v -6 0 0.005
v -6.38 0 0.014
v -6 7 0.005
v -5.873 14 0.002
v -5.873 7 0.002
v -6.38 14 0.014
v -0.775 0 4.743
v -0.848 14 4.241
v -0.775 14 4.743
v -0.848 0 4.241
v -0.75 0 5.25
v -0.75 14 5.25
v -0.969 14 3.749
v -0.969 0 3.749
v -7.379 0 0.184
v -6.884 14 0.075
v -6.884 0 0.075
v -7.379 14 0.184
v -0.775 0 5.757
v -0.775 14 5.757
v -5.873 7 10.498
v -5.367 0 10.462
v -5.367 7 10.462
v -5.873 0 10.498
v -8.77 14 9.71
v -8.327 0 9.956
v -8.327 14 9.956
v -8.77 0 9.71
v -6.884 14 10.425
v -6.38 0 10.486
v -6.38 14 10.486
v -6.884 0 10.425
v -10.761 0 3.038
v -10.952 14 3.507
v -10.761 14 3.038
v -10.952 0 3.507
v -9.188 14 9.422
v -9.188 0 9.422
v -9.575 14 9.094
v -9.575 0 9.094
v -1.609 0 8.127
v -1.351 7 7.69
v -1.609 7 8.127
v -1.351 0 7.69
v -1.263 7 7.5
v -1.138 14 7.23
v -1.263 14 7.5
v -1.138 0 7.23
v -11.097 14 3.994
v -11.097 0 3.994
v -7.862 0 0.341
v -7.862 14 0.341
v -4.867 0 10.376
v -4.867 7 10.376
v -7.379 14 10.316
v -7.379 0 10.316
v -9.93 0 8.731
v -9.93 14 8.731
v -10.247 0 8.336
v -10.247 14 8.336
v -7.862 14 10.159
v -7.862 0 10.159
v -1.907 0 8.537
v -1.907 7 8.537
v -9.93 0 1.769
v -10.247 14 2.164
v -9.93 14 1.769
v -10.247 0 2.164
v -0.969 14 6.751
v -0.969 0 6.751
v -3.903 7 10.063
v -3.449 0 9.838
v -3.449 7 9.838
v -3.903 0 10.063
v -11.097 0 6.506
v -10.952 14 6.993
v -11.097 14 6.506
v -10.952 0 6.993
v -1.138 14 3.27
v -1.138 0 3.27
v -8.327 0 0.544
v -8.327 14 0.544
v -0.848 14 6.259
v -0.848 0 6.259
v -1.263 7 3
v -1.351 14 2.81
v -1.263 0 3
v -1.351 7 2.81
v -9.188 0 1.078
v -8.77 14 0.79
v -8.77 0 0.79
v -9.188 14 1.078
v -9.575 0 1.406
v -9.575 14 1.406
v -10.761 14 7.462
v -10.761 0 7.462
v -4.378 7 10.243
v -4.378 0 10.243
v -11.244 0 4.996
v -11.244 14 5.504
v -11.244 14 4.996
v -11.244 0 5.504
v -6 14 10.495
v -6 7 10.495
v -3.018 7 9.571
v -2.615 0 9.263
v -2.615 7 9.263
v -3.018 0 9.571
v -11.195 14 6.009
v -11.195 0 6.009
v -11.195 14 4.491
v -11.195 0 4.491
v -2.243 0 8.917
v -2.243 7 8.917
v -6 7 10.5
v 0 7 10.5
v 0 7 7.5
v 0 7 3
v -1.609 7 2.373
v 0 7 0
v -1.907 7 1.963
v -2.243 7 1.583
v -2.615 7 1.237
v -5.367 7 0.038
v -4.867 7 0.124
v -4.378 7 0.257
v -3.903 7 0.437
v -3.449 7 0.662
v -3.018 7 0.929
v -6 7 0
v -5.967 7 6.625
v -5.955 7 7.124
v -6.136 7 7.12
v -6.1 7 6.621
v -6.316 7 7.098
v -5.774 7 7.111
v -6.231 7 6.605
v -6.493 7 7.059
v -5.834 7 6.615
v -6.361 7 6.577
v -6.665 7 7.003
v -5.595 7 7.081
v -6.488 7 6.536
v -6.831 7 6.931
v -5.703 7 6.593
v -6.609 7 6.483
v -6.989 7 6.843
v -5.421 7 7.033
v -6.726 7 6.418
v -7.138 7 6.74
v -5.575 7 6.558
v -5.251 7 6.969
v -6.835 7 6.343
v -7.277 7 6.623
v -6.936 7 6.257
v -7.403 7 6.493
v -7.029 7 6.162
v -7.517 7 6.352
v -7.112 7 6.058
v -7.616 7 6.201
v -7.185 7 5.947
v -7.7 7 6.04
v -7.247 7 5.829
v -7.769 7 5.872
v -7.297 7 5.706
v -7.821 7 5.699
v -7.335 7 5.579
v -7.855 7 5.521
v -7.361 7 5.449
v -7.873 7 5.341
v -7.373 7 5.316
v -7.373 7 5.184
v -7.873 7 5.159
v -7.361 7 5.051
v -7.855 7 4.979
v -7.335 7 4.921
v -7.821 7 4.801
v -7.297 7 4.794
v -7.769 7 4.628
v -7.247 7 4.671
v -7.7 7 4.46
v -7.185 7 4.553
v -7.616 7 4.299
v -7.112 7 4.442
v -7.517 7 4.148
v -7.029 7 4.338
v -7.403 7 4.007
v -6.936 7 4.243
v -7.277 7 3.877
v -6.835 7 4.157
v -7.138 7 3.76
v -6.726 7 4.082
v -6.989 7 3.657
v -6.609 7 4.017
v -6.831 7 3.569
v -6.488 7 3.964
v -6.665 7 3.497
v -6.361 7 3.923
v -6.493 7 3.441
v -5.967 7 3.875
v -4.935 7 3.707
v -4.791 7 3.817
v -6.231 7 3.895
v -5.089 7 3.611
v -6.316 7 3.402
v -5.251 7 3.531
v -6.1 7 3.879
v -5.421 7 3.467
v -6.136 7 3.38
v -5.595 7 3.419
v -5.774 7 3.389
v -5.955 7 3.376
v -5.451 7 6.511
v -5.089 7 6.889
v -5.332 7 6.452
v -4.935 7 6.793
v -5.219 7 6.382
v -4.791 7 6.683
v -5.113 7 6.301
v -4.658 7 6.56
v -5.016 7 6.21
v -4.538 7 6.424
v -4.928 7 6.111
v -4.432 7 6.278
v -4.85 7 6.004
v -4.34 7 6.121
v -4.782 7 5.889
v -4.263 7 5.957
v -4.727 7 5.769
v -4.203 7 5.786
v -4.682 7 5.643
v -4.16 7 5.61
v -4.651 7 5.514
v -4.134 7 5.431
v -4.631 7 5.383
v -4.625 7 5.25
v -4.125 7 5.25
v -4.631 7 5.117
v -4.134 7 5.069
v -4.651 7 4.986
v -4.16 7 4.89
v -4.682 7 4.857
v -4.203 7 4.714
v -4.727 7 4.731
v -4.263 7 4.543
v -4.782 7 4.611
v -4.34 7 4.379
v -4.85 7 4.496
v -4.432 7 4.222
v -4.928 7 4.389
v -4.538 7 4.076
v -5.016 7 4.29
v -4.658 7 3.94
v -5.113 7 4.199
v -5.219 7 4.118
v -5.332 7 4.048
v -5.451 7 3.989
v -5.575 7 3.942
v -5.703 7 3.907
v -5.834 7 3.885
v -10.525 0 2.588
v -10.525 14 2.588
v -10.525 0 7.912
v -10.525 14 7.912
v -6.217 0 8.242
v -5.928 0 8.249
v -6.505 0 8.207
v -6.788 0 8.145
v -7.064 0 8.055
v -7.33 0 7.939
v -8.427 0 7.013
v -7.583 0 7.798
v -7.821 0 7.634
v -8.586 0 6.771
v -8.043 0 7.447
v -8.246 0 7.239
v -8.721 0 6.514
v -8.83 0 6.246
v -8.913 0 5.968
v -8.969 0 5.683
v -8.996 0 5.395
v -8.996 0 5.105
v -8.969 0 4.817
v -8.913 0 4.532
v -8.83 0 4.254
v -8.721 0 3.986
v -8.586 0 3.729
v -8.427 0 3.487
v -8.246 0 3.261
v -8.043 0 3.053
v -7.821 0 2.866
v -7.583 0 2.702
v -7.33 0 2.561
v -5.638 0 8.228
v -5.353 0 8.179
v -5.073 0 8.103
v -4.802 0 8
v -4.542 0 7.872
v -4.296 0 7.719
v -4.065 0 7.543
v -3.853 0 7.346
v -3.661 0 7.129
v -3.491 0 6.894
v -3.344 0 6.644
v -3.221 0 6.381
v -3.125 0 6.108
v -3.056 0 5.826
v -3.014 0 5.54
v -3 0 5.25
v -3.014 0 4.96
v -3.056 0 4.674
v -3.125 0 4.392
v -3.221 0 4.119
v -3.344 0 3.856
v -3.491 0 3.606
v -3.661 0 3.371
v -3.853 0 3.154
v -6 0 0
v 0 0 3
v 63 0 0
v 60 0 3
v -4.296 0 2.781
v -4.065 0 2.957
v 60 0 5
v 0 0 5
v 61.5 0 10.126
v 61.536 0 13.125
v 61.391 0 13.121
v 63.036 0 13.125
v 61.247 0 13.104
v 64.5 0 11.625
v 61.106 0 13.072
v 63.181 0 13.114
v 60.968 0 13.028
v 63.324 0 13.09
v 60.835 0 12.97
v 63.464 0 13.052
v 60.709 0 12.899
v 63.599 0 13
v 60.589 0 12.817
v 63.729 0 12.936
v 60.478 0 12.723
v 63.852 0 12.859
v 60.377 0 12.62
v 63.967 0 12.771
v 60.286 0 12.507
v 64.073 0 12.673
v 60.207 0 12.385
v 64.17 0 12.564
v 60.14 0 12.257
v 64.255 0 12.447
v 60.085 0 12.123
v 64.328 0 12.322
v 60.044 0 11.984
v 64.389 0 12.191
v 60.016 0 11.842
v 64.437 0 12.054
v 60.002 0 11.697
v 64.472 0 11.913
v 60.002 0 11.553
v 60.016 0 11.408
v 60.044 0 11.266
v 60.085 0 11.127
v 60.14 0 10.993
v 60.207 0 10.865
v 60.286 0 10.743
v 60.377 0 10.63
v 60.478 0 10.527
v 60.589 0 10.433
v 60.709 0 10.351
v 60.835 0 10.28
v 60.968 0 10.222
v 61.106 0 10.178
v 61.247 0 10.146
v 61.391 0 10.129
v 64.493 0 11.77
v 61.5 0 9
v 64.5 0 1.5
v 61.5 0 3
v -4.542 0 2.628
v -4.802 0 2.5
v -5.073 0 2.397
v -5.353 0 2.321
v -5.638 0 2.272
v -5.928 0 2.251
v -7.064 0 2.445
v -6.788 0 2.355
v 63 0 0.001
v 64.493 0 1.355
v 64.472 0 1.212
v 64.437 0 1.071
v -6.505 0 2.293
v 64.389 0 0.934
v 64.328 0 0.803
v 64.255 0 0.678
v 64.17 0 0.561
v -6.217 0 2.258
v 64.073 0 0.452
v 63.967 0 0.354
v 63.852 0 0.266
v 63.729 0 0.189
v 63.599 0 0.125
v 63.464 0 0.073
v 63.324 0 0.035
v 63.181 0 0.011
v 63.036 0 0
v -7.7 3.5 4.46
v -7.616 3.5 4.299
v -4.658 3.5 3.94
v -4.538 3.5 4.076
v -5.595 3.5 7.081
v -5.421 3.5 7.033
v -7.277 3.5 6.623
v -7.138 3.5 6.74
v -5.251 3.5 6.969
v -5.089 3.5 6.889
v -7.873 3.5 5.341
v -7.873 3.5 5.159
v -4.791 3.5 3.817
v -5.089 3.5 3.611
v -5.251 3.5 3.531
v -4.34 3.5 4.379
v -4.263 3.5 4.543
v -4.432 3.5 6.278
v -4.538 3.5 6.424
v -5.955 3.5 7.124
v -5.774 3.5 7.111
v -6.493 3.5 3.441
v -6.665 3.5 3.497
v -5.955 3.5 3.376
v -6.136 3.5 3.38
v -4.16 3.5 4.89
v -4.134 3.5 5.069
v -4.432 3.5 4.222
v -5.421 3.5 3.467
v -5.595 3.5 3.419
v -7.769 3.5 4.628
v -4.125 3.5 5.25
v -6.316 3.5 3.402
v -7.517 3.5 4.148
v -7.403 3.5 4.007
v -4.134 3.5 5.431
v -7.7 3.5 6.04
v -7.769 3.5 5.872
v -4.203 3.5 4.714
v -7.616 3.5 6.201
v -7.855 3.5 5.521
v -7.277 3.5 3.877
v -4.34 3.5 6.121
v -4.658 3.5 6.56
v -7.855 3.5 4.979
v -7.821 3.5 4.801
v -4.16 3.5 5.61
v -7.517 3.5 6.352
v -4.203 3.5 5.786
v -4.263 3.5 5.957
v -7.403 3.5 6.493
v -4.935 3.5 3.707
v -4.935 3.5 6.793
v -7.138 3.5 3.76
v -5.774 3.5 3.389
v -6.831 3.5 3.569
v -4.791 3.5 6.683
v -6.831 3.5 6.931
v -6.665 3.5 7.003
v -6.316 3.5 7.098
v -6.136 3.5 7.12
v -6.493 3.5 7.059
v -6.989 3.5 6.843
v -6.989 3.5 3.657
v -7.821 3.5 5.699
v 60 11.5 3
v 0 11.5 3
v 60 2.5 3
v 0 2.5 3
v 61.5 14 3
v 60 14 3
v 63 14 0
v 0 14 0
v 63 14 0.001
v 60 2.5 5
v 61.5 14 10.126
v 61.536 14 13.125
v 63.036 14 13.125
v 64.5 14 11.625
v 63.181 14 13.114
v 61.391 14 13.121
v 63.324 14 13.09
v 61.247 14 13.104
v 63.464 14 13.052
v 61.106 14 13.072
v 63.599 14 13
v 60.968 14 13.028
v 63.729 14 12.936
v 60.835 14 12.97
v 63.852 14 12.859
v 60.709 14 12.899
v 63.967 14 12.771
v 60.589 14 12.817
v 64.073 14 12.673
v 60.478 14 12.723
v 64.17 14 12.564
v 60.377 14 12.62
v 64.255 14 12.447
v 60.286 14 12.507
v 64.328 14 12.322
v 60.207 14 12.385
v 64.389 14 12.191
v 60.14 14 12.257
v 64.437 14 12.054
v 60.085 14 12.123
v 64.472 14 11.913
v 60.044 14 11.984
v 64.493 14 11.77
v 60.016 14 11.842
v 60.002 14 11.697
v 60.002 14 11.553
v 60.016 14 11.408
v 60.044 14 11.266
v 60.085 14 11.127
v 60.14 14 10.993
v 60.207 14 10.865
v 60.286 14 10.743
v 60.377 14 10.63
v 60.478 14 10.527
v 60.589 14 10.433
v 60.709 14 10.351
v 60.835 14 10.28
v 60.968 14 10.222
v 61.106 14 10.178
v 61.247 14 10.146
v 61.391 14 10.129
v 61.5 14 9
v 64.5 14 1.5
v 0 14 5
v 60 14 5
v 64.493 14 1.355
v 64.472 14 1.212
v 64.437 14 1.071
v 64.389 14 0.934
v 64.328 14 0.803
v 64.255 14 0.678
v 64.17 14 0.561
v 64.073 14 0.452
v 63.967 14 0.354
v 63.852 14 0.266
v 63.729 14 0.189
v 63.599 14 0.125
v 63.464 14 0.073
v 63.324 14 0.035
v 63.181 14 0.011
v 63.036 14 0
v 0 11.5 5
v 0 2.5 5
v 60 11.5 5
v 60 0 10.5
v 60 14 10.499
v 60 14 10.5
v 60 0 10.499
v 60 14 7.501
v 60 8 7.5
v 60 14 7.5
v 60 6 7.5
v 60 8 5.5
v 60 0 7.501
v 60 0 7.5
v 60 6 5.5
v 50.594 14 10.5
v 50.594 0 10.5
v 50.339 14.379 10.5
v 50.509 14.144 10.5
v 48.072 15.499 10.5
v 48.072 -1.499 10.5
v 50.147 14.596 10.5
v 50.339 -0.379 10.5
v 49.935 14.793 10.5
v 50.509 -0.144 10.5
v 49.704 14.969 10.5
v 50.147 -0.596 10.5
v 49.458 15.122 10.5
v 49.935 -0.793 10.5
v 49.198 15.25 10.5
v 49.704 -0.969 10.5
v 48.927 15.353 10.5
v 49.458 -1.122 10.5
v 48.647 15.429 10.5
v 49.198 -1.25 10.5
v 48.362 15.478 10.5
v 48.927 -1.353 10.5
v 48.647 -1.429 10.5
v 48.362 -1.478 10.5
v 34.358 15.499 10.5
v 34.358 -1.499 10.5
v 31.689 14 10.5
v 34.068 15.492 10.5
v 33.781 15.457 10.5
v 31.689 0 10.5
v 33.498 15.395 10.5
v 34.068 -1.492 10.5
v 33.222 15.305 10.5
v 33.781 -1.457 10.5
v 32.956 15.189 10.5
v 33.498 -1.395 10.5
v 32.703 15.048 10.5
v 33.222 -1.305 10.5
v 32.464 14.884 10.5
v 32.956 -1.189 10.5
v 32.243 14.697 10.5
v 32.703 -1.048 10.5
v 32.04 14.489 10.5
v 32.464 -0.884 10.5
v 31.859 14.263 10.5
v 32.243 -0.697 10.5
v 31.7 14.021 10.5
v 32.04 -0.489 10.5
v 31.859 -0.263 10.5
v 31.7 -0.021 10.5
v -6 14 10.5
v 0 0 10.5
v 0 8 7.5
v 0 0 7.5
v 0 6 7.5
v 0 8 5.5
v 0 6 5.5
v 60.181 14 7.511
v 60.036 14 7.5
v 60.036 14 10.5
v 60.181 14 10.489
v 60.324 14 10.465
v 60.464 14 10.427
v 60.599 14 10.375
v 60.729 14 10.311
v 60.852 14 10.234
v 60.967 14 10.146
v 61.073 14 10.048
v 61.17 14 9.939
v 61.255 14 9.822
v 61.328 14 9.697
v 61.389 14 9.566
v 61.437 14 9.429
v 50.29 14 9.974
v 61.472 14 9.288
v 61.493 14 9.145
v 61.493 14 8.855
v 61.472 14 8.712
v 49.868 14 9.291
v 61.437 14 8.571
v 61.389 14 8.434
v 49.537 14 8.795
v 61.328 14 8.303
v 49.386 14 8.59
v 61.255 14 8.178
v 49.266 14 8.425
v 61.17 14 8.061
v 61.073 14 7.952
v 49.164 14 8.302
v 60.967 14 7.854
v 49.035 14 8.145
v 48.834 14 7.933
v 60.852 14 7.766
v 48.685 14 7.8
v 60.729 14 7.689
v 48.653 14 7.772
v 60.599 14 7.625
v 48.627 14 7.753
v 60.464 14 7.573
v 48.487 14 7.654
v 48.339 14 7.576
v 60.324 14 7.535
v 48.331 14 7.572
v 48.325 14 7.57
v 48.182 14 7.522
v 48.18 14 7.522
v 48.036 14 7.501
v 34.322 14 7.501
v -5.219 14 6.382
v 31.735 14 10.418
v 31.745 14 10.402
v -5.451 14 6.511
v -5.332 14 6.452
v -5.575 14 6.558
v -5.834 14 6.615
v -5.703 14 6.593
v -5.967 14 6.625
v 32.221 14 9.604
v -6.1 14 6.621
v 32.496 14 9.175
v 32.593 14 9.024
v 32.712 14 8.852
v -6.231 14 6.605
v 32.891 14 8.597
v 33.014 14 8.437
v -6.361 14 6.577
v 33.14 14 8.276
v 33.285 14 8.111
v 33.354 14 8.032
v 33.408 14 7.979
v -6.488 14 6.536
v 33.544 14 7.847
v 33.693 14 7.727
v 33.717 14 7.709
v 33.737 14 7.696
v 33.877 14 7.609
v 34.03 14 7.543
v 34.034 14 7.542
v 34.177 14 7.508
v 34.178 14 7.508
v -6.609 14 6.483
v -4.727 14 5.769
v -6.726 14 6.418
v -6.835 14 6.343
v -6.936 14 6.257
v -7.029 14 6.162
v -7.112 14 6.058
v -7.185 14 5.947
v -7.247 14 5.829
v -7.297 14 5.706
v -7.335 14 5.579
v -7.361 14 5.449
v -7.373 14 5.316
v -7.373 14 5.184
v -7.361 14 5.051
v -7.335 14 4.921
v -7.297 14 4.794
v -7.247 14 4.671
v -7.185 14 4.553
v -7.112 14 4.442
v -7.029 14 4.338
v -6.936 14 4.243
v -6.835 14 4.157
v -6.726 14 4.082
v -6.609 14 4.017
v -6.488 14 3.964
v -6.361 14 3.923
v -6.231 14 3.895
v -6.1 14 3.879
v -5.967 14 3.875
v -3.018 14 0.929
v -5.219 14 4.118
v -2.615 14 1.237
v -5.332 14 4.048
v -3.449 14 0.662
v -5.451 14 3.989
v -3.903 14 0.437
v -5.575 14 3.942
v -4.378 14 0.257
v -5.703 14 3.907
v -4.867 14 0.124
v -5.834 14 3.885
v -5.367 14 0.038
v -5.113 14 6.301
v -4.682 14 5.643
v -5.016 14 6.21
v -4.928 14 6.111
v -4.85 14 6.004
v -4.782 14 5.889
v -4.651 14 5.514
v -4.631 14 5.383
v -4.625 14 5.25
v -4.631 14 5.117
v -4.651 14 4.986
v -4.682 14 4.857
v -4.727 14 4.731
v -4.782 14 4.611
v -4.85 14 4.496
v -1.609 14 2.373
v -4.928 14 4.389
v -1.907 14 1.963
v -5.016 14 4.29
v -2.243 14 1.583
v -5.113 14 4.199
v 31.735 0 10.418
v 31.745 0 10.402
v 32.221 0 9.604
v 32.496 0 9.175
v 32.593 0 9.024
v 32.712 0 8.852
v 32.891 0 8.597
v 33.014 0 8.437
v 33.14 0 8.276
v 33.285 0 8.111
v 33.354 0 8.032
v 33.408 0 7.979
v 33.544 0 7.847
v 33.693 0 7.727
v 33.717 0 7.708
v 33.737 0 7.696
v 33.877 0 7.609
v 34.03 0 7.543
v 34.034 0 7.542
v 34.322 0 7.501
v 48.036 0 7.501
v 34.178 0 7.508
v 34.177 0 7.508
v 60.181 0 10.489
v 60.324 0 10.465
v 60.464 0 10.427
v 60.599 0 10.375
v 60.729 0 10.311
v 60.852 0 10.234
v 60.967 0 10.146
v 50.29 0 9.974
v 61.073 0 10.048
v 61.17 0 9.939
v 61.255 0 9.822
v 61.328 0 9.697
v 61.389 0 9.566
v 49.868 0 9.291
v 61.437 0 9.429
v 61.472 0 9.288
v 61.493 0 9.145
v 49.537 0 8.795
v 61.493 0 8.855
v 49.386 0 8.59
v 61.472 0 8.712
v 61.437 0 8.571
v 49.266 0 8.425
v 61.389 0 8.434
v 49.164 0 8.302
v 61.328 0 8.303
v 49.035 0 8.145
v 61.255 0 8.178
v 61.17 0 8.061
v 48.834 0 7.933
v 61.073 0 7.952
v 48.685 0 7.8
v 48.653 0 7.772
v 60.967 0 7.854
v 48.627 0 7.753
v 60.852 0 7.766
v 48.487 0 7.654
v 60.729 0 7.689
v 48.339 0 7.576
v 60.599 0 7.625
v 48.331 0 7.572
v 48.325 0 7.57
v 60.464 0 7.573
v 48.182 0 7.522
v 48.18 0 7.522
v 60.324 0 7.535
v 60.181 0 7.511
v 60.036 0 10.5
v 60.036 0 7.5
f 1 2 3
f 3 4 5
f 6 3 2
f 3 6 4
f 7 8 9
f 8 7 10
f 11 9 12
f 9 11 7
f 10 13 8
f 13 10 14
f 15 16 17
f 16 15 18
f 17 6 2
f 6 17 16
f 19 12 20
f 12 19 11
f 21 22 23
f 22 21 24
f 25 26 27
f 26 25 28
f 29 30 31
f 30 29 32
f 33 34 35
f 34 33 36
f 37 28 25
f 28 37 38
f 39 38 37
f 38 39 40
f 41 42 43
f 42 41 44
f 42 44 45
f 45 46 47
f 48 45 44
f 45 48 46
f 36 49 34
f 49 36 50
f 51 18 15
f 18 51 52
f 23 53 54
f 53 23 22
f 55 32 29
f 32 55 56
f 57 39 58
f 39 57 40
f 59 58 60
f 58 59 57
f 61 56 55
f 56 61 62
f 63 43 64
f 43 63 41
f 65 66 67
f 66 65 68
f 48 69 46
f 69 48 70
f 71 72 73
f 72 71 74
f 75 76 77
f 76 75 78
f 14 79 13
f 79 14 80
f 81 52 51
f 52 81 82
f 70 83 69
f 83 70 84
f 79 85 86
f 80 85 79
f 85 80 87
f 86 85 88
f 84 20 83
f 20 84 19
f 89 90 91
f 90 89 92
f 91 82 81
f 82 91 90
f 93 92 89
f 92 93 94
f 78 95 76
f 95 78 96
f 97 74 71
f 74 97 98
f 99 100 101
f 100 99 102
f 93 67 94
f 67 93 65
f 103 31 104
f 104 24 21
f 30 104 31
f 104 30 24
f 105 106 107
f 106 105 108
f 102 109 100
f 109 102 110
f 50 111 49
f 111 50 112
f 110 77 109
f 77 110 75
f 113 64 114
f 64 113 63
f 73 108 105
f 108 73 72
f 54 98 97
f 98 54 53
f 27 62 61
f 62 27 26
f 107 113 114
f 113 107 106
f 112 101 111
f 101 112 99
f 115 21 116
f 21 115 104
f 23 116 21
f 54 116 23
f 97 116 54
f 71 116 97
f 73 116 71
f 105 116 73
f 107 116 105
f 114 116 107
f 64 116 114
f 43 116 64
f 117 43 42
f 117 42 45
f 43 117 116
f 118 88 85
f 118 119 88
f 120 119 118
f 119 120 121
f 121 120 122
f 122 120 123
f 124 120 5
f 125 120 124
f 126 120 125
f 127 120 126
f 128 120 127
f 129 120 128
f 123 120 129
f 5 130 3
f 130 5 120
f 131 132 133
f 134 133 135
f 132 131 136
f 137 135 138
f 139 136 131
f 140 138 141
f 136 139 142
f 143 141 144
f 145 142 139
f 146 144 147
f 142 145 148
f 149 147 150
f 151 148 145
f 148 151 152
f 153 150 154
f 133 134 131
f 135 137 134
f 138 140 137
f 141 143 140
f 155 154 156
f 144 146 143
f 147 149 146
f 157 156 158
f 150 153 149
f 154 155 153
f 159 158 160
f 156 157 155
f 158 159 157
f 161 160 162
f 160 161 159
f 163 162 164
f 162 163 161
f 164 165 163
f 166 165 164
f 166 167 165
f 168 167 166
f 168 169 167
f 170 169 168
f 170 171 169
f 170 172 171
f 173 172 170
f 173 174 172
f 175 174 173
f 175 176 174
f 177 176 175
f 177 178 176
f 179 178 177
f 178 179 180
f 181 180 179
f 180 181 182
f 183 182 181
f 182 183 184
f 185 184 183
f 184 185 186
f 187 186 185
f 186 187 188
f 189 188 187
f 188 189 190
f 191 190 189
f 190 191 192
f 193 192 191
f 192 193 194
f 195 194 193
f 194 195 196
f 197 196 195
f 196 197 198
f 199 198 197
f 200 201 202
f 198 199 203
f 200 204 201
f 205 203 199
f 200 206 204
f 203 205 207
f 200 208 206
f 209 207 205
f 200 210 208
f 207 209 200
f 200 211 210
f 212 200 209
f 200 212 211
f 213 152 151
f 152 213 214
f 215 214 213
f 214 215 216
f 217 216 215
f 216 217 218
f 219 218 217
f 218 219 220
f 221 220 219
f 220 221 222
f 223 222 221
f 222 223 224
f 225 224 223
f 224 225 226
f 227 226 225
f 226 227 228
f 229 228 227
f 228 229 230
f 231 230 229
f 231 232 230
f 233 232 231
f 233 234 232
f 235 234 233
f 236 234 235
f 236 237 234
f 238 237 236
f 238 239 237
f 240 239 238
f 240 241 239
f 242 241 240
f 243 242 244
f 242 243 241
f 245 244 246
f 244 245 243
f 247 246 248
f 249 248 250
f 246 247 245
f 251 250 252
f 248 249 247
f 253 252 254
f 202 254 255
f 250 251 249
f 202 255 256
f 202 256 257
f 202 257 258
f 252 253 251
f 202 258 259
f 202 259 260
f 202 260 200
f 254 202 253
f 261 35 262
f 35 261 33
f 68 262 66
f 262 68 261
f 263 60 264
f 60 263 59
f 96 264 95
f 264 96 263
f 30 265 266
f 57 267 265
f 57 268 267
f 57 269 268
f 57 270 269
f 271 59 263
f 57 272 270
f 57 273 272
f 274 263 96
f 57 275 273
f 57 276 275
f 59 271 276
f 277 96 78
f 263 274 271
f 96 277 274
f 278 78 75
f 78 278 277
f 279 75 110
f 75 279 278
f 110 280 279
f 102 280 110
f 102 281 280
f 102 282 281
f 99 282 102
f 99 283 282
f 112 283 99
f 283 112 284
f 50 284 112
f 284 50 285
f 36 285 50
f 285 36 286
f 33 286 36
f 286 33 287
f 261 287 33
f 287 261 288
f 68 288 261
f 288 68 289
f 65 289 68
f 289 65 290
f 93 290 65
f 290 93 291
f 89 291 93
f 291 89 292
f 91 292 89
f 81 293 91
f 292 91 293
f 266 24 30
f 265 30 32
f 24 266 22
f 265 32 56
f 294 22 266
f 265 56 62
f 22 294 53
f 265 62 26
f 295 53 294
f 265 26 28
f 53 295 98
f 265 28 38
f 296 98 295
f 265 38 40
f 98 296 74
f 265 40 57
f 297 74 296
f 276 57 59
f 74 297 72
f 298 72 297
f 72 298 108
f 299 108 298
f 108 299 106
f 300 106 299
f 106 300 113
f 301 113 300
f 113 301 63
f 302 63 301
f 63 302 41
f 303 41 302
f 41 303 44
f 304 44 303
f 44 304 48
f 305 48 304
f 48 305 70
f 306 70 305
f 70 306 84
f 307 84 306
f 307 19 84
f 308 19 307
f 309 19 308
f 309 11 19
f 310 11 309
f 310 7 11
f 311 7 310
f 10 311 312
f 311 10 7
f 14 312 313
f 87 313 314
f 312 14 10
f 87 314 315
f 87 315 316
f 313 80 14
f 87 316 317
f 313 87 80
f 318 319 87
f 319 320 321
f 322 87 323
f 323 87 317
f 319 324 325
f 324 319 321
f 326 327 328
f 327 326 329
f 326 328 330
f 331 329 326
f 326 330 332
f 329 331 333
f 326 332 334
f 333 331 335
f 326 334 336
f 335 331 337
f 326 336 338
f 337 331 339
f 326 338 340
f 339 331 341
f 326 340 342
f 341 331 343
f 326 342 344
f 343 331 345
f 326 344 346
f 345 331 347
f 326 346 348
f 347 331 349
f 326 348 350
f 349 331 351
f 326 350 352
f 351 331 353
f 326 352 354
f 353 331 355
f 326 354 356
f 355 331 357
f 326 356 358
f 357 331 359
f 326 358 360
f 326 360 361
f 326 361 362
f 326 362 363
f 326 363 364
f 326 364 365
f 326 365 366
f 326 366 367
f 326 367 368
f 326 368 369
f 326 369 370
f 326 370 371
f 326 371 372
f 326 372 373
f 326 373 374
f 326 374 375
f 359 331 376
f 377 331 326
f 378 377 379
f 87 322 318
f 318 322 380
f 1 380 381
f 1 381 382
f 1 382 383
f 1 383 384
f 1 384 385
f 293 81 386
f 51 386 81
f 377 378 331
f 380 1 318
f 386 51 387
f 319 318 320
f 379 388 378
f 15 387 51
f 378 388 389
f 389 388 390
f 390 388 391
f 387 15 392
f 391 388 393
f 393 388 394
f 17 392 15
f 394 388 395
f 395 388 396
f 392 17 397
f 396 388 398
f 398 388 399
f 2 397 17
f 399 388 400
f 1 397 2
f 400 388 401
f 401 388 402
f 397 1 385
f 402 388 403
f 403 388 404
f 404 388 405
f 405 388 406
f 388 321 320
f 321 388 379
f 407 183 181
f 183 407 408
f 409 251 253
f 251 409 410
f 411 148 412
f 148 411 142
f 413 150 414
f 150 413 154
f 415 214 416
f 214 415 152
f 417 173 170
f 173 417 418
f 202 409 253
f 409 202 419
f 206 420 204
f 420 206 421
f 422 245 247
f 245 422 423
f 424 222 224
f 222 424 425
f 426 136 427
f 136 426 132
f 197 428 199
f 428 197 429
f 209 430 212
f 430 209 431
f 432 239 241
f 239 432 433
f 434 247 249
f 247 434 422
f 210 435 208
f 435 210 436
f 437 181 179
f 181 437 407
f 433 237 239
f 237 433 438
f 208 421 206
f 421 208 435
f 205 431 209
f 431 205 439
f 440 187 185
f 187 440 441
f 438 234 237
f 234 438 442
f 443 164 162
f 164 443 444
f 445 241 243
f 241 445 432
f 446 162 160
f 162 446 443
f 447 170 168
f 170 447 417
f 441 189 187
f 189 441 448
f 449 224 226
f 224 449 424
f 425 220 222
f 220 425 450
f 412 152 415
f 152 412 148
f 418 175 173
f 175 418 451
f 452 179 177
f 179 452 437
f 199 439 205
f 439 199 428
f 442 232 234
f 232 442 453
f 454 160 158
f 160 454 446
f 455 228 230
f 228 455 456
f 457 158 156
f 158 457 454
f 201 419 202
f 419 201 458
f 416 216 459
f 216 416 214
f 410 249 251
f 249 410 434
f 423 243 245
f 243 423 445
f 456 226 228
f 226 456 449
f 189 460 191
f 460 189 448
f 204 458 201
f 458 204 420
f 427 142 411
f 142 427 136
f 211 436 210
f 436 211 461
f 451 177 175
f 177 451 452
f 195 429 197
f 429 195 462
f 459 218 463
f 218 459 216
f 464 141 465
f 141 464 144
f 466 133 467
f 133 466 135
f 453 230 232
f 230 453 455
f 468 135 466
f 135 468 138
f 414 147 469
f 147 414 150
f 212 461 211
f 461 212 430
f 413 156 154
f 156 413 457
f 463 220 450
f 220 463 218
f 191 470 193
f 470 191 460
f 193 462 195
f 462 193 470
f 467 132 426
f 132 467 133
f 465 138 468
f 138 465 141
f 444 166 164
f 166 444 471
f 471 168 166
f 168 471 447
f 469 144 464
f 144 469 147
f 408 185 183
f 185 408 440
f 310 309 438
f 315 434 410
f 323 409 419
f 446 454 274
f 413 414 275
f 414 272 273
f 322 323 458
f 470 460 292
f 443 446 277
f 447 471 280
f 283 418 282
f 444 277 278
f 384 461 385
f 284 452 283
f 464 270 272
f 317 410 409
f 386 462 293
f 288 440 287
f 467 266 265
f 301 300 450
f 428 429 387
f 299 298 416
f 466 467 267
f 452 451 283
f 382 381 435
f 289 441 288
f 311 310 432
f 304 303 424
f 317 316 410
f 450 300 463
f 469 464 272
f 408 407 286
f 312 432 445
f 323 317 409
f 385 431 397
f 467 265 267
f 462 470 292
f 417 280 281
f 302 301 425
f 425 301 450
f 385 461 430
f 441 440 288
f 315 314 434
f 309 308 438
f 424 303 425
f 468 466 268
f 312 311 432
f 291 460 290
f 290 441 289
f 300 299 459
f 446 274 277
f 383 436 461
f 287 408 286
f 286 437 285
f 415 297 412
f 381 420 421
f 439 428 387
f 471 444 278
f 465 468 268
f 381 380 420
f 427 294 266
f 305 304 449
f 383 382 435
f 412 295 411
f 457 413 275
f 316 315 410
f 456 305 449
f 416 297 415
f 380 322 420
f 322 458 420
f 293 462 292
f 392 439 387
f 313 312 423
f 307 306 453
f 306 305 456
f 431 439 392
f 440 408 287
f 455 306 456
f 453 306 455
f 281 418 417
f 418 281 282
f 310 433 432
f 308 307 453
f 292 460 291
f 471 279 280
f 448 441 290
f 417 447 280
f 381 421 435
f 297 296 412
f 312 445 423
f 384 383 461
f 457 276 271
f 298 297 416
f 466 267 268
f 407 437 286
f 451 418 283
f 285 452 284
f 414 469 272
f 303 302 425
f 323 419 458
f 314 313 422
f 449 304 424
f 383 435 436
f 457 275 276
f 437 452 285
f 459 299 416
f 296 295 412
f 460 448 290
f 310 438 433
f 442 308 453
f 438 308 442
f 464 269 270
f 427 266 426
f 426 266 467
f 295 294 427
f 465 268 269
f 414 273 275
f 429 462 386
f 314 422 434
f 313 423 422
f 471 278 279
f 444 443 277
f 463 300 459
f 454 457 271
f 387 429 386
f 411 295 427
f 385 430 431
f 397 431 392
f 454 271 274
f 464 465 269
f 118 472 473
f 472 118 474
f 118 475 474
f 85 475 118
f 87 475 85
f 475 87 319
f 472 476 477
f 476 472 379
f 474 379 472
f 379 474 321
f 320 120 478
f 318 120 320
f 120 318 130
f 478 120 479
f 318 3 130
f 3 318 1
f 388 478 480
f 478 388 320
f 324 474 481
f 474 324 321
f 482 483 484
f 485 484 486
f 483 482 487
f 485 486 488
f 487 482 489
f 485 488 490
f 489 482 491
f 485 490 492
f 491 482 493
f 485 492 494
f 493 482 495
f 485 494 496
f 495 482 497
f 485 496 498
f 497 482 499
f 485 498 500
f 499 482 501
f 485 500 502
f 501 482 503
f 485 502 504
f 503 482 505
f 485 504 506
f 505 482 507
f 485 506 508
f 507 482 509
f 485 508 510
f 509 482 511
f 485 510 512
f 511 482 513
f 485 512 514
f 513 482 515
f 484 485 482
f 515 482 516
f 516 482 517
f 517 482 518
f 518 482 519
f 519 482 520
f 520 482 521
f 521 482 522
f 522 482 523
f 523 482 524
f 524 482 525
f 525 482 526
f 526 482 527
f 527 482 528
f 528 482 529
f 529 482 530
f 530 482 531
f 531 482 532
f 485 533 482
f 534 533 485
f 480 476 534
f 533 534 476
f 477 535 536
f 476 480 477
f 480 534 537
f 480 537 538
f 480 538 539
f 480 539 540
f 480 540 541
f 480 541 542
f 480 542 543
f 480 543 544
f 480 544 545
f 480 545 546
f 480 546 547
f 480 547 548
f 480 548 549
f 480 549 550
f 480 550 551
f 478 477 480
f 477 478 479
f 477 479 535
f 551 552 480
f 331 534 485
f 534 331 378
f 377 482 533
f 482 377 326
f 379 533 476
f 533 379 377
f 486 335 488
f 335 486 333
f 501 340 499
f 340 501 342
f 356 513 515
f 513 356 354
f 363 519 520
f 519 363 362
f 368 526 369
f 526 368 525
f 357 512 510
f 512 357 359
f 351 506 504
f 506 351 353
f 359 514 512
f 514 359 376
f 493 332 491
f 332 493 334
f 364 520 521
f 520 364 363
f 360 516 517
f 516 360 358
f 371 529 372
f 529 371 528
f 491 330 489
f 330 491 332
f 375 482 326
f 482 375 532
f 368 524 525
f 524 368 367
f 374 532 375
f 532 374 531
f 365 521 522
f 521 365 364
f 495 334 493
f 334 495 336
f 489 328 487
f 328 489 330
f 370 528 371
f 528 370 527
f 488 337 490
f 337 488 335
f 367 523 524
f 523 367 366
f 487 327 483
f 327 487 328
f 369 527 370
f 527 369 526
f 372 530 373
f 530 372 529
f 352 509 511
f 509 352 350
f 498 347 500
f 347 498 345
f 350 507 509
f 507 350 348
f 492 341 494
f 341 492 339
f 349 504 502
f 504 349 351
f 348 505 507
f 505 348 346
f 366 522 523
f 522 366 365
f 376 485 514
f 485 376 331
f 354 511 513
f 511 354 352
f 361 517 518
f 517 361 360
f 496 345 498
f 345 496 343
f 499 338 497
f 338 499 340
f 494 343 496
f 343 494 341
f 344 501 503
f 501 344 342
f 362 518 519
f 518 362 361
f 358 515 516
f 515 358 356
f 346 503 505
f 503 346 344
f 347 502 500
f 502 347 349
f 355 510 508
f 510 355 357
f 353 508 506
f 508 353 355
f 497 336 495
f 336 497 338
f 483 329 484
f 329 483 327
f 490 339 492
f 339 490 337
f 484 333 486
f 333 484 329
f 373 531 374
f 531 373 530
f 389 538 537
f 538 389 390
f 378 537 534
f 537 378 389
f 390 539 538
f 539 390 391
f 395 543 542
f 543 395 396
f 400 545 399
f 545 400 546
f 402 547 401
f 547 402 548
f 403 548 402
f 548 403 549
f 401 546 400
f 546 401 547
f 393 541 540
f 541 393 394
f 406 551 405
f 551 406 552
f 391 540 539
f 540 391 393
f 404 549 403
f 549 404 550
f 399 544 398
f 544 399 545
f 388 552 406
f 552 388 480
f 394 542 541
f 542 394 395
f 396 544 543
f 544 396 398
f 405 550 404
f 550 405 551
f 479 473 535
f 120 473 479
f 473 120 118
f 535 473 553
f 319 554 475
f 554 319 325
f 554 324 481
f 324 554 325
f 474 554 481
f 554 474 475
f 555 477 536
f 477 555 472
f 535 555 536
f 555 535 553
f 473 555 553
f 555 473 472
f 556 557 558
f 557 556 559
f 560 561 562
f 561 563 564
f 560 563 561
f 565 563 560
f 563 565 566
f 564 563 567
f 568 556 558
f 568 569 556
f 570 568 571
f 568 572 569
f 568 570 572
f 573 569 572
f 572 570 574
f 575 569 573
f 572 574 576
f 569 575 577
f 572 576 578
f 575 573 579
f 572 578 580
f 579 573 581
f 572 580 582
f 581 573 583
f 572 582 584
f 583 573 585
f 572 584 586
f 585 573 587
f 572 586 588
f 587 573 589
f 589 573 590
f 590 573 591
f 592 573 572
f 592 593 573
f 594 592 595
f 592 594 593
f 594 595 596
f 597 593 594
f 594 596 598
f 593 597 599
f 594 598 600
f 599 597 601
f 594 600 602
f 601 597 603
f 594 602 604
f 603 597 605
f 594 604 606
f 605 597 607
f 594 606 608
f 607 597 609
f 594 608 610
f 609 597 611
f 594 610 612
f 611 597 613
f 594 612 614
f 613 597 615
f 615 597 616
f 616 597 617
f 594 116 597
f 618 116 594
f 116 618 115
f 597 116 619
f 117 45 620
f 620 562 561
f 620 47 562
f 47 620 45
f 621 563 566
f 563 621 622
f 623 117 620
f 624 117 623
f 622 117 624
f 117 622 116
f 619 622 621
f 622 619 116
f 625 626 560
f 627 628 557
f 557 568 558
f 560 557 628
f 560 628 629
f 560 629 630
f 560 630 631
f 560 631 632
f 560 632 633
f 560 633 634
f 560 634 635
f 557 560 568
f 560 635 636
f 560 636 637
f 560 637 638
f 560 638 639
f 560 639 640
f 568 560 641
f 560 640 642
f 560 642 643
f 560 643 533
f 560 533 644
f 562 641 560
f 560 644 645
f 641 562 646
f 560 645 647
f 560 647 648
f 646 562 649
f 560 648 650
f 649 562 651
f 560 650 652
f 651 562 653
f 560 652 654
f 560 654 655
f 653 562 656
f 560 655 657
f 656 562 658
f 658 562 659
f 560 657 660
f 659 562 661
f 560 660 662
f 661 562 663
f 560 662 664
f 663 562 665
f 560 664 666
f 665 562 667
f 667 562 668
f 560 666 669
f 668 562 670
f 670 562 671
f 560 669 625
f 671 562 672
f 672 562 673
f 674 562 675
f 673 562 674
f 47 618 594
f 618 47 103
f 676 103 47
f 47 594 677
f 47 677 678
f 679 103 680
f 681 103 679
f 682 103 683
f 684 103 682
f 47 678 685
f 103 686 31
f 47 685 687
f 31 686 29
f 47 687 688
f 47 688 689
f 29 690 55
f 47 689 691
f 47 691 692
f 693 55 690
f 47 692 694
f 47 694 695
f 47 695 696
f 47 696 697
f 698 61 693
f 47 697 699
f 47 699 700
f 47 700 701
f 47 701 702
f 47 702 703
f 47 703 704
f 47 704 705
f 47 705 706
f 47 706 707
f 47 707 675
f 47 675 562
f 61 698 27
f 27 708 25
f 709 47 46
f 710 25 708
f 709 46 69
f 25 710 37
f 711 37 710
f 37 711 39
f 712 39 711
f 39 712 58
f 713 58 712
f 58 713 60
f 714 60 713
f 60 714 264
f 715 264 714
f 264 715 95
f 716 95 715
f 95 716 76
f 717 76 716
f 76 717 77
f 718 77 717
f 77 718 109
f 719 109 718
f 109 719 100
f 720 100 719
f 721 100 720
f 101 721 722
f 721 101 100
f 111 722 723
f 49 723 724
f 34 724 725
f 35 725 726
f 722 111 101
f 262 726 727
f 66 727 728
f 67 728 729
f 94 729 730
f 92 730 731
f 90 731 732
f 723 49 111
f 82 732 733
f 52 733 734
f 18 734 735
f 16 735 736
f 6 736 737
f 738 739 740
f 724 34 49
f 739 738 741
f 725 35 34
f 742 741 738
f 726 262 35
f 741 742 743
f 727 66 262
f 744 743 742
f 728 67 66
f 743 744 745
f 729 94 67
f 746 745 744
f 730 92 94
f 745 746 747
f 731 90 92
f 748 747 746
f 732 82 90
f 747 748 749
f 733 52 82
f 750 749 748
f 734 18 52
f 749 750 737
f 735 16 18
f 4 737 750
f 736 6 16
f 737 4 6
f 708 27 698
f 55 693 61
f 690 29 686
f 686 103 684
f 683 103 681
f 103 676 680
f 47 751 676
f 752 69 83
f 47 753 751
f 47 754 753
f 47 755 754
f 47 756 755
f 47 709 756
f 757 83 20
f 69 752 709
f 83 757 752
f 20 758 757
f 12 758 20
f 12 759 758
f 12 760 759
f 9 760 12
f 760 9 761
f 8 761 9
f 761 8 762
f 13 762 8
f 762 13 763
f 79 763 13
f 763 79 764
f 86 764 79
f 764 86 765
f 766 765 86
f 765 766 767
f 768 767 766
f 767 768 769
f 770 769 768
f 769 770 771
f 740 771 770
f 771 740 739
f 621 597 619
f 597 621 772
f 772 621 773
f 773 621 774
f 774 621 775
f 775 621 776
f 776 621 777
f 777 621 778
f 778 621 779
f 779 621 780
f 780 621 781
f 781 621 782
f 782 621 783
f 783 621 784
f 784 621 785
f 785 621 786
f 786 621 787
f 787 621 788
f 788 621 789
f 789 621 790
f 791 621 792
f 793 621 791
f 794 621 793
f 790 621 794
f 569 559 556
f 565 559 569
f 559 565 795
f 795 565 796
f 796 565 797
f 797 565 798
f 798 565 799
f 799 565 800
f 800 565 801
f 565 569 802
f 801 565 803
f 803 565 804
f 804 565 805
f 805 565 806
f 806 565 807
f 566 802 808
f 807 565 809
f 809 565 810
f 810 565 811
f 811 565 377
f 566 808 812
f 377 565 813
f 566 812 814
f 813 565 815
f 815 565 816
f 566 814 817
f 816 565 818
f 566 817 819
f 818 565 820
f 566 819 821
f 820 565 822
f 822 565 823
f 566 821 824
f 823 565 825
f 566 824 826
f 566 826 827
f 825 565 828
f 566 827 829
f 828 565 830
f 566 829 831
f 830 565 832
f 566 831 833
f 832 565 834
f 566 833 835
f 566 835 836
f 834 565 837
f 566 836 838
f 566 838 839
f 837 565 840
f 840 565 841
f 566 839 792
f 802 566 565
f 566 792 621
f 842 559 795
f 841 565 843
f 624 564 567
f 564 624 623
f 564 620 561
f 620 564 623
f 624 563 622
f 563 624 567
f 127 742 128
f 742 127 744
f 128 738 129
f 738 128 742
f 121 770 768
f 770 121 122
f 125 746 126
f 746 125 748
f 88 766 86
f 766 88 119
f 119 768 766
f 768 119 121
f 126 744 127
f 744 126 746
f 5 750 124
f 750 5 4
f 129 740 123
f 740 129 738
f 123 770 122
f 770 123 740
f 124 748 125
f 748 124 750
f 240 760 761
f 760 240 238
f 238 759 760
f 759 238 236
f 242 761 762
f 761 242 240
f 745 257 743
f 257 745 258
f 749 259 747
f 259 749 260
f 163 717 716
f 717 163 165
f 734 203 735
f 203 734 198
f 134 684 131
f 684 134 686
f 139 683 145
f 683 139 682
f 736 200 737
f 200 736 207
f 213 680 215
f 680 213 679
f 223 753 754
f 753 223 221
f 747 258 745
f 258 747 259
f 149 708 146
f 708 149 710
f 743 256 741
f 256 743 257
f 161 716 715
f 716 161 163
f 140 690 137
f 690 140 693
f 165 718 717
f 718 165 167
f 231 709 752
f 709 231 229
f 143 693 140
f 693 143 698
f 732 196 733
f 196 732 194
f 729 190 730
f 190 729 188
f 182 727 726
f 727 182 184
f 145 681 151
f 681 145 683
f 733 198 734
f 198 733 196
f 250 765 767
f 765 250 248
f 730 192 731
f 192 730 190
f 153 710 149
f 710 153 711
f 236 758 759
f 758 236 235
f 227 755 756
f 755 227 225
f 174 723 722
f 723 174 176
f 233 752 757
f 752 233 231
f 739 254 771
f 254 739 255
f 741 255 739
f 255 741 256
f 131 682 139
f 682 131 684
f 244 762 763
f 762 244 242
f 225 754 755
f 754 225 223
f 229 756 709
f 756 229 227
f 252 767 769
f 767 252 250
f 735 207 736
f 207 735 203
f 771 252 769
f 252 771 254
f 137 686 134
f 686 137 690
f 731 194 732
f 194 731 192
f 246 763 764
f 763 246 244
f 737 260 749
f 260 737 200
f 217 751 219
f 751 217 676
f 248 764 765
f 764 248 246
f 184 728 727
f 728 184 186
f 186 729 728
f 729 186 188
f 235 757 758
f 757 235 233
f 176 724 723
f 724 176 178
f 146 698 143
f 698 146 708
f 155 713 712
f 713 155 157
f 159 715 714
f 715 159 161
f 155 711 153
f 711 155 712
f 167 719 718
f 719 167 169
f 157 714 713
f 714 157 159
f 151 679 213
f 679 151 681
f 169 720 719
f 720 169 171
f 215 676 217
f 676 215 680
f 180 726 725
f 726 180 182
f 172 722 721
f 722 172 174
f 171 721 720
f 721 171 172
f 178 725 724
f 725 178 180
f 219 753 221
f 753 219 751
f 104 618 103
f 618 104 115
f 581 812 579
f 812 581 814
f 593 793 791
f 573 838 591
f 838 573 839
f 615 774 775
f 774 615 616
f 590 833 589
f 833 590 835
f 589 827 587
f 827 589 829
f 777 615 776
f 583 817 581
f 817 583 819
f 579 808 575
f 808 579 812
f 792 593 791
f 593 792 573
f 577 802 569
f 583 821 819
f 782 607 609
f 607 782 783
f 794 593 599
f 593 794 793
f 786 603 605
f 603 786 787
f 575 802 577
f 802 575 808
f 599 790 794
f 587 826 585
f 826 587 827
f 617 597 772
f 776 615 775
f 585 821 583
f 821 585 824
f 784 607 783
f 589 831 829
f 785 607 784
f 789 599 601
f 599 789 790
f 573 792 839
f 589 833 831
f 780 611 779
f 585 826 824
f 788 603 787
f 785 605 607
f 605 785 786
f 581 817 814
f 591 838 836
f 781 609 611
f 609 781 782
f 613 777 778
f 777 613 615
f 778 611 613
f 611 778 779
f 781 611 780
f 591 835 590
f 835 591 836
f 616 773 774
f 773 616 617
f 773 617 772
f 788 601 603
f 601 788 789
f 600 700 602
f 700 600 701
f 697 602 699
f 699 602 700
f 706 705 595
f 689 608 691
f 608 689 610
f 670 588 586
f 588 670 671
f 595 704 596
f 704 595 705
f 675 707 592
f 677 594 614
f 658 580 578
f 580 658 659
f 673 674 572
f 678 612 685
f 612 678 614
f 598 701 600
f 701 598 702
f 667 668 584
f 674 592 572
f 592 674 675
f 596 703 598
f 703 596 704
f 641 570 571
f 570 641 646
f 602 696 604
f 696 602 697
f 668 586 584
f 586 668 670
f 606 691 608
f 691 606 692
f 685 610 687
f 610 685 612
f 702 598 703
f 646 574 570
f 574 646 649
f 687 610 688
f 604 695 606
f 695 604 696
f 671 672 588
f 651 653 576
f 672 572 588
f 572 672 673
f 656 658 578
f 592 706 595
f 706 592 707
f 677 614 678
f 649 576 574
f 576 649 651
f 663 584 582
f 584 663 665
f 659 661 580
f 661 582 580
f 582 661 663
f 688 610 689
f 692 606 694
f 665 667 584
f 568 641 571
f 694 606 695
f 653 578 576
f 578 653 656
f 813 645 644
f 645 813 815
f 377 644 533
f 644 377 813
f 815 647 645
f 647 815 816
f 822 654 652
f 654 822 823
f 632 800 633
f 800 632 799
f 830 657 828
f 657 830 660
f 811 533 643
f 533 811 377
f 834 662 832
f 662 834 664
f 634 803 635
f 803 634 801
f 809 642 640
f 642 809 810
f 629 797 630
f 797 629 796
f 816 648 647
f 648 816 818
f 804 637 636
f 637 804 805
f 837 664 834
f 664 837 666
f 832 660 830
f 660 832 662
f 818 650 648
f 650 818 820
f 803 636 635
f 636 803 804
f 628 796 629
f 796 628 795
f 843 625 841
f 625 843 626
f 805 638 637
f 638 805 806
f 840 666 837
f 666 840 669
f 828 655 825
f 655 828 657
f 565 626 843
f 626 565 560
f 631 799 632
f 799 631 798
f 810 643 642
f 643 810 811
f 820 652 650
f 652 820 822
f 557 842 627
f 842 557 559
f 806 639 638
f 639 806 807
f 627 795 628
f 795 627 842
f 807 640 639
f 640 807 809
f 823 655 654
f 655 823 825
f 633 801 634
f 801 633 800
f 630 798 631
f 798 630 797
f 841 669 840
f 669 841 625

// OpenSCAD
//BY DOWNLOADING, OPENING AND/OR USING THIS WORK YOU AGREE TO THE TERMS AND CONDITIONS CONTAINED AT THE END OF THIS FILE.

resolution = 65; //[20:Low, 65:Medium, 200:High]

//Length of the clamping face for the clip.
length=60;

//Width of the clip.
width=14; //12.75

//Width of the clamping studs.
studwidth=2.5;

//Height of the clamping studs.
studheight=2;

//Thickness of clamp arms.
thickness=3;

//Sealing gap.
gap=2.5; //0.4

//Screw hole size for hinge.
hole=3.75;

//Countersinking.
screwtop=6;

//Clip thread for screw.
thread=2.75;

//Hand grips. Makes opening clips easier.
grip=1; //[0:No Grip, 1:Grip]

//Spliting for printing. 0=All, 1=Base, 2=Top.
display=0; //[0:All, 1:Base, 2:Top]

$fn=resolution;

lift=0;

if (display==0||display==1) {
translate([length,0,0]) cube([thickness,width,thickness]);

translate([length+thickness/2,0,thickness/2]) cube([thickness,width,thickness*1.875+studheight+gap]);

hull() {
translate([length+thickness/2,0,thickness*2.375+studheight+gap]) rotate([-90,0,0]) cylinder(width,thickness/2,thickness/2);
    
translate([length+thickness,0,thickness*2.375+studheight+gap]) rotate([-90,0,0]) cylinder(width,thickness/2,thickness/2);
}

translate([length+thickness,0,thickness/2]) rotate([-90,0,0]) cylinder(width,thickness/2,thickness/2);

//base//
cube([length,width,thickness]);

//base studs
translate([0,0,0]) cube([length,studwidth,thickness+studheight]);
translate([0,width-studwidth,0]) cube([length,studwidth,thickness+studheight]);

//hindge cylinder base
translate([-thickness*2,0,thickness+studheight/2+gap/2]) rotate([-90,0,0]) {
difference() {
cylinder(width/2,thickness+studheight/2+gap/2,thickness+studheight/2+gap/2);
cylinder(width,hole/2,hole/2);
cylinder(width/4,screwtop/2,hole/2);
}
}

//hinge bridge
translate([-thickness*2,0,0]) {
difference() {
cube([width,width/2,thickness]);
translate([0,0,thickness+studheight/2+gap/2]) rotate([-90,0,0])
cylinder(width/2,thickness+studheight/2,thickness+studheight/2);
}
}
}

if (display==0||display==2) {
//top//
translate([0,0,thickness+studheight+gap+lift]) {
cube([length,width,thickness]);

//top stud
translate([0,width/4+gap,-studheight]) 
cube([length,width/2-gap*2,thickness+studheight]);
}


//hindge cylinder top
translate([-thickness*2,width/2,thickness+studheight/2+gap/2+lift]) rotate([-90,0,0]) {
difference() {    
cylinder(width/2,thickness+studheight/2+gap/2,thickness+studheight/2+gap/2);
cylinder(width,thread/2,thread/2);
}
}
   
//hinge bridge
translate([-thickness*2,width/2,0]) {
difference() {
translate([0,0,thickness+studheight+gap+lift]) cube([width,width/2,thickness]);
translate([0,0,thickness+studheight/2+gap/2+lift]) rotate([-90,0,0])    cylinder(width/2,thickness+studheight/2,thickness+studheight/2);
}
}

translate([length,0,thickness*1.5+studheight+gap+lift]) rotate([-90,0,0]) cylinder(width,thickness/2,thickness/2);

if (grip==1) {
hull() {
translate([length/1.75,thickness/2,thickness+studheight+gap+lift]) cylinder(thickness,thickness/2,thickness);
translate([length/1.25,thickness/2,thickness+studheight+gap+lift]) cylinder(thickness,thickness/2,thickness);
}

hull() {
translate([length/1.75,width-thickness/2,thickness+studheight+gap+lift]) cylinder(thickness,thickness/2,thickness);
translate([length/1.25,width-thickness/2,thickness+studheight+gap+lift]) cylinder(thickness,thickness/2,thickness);
}
}
}

//License Conditions 

//Rights: 
//Save and privately distribute modified copies for the sole purpose of convenience, provided the license remains included and unmodified. 
//Use this design in a commercial setting provided it is on a single case basis. 
//Review the code and values for learning purposes. 
//Display this design in a public setting provided the appropriate attributions are included and clearly visible. 

//Conditions (without prior written permission): 
//Sell, gain profit from or relicense this design in any format or by any means, commercially or otherwise. 
//Directly copy sections of code for any other project or design. 
//Publicly redistribute or host this file. 
//The design owner can revoke all rights at any time, including all use, for any reason. Sorry.
